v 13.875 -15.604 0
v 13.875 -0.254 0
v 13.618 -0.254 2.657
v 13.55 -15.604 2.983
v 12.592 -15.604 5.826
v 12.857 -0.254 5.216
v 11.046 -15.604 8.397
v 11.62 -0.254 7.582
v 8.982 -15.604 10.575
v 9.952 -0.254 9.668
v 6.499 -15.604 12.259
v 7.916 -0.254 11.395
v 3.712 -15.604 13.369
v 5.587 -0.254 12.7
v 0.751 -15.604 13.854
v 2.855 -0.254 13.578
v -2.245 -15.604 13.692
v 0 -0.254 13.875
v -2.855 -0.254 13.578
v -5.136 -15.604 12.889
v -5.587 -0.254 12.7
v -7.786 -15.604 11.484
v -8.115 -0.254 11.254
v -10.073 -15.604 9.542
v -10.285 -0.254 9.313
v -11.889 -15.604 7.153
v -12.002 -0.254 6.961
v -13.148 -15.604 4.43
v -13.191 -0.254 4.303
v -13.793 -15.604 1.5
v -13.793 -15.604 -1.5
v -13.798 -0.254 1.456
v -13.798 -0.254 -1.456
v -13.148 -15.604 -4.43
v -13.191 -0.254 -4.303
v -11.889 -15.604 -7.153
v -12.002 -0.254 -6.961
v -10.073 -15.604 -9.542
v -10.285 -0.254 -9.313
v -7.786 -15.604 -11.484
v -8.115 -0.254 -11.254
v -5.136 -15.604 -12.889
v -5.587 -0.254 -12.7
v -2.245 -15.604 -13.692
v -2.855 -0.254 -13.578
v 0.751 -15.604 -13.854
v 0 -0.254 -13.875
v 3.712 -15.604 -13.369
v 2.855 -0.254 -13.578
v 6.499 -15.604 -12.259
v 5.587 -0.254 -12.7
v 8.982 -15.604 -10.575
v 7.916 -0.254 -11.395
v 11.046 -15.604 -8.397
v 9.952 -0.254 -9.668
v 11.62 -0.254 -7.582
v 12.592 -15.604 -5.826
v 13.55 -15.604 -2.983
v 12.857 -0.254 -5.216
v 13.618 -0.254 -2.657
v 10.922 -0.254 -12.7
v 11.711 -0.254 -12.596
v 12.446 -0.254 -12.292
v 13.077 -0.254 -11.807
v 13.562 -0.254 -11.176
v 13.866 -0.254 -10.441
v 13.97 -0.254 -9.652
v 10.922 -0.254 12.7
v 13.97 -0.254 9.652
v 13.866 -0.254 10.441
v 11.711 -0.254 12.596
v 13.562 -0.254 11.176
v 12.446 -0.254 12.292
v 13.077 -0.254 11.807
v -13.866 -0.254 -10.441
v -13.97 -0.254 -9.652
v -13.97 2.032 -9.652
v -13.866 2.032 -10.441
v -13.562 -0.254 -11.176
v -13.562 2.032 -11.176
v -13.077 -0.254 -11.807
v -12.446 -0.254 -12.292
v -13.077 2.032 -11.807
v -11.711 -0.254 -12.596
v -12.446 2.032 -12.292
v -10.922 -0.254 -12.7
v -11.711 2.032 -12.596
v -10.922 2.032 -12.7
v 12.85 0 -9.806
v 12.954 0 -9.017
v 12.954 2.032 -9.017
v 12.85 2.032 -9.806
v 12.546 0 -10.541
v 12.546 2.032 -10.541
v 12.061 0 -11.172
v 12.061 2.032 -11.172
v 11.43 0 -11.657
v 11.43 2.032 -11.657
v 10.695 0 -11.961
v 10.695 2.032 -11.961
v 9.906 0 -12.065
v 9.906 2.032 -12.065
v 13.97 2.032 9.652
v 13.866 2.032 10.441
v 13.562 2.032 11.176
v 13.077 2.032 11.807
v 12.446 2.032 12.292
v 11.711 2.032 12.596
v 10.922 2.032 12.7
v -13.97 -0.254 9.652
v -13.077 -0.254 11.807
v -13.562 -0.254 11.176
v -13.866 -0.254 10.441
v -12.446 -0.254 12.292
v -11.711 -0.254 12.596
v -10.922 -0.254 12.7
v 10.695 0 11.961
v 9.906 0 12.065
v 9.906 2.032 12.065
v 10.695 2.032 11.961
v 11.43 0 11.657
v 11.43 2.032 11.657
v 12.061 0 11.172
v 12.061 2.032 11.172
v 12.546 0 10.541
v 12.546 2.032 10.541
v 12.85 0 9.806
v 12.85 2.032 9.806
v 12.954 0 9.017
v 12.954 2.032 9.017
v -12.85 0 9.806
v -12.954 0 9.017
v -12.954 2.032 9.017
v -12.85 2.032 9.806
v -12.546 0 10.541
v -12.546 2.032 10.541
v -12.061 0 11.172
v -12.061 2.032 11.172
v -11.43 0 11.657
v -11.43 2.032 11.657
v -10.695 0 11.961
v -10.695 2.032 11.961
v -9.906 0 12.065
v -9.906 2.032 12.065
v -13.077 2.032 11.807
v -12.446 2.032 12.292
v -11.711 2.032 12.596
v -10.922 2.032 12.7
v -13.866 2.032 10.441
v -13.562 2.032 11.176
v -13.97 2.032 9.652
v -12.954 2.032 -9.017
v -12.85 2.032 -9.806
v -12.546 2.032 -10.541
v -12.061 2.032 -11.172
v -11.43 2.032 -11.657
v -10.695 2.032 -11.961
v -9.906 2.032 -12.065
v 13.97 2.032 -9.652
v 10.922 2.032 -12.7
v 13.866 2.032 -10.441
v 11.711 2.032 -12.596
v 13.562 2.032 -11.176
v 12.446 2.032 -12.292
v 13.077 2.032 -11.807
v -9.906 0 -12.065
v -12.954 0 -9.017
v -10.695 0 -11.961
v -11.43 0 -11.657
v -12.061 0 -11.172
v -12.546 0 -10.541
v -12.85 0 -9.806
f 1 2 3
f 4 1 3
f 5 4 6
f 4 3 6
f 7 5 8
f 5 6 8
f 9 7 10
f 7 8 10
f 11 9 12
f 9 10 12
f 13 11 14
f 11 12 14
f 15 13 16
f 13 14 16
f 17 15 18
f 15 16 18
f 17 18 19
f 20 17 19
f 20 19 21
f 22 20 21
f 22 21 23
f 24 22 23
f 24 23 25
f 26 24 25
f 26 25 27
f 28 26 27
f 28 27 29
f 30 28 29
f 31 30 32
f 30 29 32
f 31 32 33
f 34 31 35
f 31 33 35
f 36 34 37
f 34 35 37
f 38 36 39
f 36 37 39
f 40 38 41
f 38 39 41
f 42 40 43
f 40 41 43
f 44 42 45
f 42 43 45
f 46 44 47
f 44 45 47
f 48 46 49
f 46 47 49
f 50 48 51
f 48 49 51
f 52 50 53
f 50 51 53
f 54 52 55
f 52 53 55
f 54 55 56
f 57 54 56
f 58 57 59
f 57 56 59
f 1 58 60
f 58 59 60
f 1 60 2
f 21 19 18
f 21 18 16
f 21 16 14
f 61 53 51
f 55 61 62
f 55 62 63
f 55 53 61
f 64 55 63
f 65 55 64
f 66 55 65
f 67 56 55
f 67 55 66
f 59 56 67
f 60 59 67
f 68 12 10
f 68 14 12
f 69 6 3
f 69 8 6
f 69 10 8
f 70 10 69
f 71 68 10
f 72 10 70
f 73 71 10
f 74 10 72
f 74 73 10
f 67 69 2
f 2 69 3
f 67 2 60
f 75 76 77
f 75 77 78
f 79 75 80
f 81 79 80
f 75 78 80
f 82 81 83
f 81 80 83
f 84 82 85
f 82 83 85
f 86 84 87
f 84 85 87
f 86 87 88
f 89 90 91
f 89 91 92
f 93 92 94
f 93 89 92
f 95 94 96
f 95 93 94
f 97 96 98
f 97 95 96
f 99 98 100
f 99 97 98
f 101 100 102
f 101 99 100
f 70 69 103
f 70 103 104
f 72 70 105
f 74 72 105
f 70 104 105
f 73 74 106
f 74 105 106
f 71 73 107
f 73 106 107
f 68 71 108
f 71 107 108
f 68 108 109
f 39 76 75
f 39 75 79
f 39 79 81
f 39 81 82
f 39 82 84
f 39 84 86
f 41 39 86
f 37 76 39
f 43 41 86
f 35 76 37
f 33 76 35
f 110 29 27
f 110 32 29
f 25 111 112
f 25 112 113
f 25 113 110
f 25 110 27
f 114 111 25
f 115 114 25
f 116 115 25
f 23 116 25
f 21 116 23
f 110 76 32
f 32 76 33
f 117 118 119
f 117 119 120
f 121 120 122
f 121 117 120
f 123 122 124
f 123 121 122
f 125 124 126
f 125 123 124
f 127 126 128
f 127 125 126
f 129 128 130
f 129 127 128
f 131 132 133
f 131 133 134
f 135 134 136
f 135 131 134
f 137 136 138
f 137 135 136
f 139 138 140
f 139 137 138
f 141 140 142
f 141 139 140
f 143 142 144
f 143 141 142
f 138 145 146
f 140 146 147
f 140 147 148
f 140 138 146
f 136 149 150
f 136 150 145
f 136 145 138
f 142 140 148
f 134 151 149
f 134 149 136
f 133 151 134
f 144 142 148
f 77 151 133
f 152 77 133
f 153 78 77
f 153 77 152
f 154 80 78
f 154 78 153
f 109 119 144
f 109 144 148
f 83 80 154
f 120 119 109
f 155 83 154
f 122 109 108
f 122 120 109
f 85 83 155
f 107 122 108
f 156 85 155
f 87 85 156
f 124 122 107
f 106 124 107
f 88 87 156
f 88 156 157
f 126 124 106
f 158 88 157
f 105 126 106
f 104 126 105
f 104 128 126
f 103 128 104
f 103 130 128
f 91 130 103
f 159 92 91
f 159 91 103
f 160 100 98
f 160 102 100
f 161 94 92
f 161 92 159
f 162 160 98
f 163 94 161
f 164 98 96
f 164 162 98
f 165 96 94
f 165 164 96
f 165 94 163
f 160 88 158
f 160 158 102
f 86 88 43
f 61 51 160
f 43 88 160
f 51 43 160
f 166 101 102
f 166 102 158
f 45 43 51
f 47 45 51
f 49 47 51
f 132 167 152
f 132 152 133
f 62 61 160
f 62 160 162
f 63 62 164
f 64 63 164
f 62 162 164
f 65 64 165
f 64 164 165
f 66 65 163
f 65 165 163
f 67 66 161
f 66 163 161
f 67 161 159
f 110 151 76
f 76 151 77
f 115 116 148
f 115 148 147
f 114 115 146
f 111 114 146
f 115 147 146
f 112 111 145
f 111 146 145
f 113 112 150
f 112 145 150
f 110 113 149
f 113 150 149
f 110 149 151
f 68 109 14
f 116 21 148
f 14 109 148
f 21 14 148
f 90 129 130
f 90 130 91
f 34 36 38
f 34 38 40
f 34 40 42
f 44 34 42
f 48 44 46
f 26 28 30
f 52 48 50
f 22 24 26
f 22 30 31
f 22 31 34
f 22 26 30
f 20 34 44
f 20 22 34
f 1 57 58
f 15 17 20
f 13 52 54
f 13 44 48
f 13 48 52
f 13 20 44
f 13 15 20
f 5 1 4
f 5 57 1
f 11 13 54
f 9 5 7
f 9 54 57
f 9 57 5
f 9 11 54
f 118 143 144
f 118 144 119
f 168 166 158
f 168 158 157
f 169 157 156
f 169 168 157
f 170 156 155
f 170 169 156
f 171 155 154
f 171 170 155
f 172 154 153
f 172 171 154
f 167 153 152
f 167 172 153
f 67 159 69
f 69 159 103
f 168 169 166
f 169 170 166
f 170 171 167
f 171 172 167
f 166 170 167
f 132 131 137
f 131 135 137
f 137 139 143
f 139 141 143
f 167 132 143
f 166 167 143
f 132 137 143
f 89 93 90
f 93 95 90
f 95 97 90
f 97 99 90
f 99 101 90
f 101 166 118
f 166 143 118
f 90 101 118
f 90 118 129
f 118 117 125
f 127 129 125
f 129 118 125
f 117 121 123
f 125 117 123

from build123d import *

# Parameters (mm, degrees)
BOSS_EXTRUDE1_DEPTH = 2.032
BOSS_EXTRUDE2_DEPTH = 0.254
SKETCH3_R           = 13.87475
BOSS_EXTRUDE3_DEPTH = 15.35


with BuildPart() as part:
    # Sketch1 → Boss-Extrude1 (new body)
    with BuildSketch(Plane(origin=(0, 0, 0), x_dir=(1, 0, 0), z_dir=(0, 1, 0))):
        with BuildLine():
            Line((-10.922, -12.7), (10.922, -12.7))
            ThreePointArc((10.922, -12.7), (13.077261469, -11.807261469), (13.97, -9.652))
            Line((13.97, -9.652), (13.97, 9.652))
            ThreePointArc((13.97, 9.652), (13.077261469, 11.807261469), (10.922, 12.7))
            Line((10.922, 12.7), (-10.922, 12.7))
            ThreePointArc((-10.922, 12.7), (-13.077261469, 11.807261469), (-13.97, 9.652))
            Line((-13.97, 9.652), (-13.97, -9.652))
            ThreePointArc((-13.97, -9.652), (-13.077261469, -11.807261469), (-10.922, -12.7))
        make_face()
        with BuildLine():
            Line((-9.906, -12.065), (9.906, -12.065))
            ThreePointArc((9.906, -12.065), (12.061261469, -11.172261469), (12.954, -9.017))
            Line((12.954, -9.017), (12.954, 9.017))
            ThreePointArc((12.954, 9.017), (12.061261469, 11.172261469), (9.906, 12.065))
            Line((9.906, 12.065), (-9.906, 12.065))
            ThreePointArc((-9.906, 12.065), (-12.061261469, 11.172261469), (-12.954, 9.017))
            Line((-12.954, 9.017), (-12.954, -9.017))
            ThreePointArc((-12.954, -9.017), (-12.061261469, -11.172261469), (-9.906, -12.065))
        make_face(mode=Mode.SUBTRACT)
    extrude(amount=BOSS_EXTRUDE1_DEPTH)

    # Sketch2 → Boss-Extrude2 (add)
    with BuildSketch(Plane.XZ):
        with BuildLine():
            Line((-10.922, -12.7), (10.922, -12.7))
            ThreePointArc((10.922, -12.7), (13.077261469, -11.807261469), (13.97, -9.652))
            Line((13.97, -9.652), (13.97, 9.652))
            ThreePointArc((13.97, 9.652), (13.077261469, 11.807261469), (10.922, 12.7))
            Line((10.922, 12.7), (-10.922, 12.7))
            ThreePointArc((-10.922, 12.7), (-13.077261469, 11.807261469), (-13.97, 9.652))
            Line((-13.97, 9.652), (-13.97, -9.652))
            ThreePointArc((-13.97, -9.652), (-13.077261469, -11.807261469), (-10.922, -12.7))
        make_face()
    extrude(amount=BOSS_EXTRUDE2_DEPTH)

    # Sketch3 → Boss-Extrude3 (add)
    with BuildSketch(Plane.XZ.offset(0.254)):
        Circle(SKETCH3_R)
    extrude(amount=BOSS_EXTRUDE3_DEPTH)


solid = part.part
